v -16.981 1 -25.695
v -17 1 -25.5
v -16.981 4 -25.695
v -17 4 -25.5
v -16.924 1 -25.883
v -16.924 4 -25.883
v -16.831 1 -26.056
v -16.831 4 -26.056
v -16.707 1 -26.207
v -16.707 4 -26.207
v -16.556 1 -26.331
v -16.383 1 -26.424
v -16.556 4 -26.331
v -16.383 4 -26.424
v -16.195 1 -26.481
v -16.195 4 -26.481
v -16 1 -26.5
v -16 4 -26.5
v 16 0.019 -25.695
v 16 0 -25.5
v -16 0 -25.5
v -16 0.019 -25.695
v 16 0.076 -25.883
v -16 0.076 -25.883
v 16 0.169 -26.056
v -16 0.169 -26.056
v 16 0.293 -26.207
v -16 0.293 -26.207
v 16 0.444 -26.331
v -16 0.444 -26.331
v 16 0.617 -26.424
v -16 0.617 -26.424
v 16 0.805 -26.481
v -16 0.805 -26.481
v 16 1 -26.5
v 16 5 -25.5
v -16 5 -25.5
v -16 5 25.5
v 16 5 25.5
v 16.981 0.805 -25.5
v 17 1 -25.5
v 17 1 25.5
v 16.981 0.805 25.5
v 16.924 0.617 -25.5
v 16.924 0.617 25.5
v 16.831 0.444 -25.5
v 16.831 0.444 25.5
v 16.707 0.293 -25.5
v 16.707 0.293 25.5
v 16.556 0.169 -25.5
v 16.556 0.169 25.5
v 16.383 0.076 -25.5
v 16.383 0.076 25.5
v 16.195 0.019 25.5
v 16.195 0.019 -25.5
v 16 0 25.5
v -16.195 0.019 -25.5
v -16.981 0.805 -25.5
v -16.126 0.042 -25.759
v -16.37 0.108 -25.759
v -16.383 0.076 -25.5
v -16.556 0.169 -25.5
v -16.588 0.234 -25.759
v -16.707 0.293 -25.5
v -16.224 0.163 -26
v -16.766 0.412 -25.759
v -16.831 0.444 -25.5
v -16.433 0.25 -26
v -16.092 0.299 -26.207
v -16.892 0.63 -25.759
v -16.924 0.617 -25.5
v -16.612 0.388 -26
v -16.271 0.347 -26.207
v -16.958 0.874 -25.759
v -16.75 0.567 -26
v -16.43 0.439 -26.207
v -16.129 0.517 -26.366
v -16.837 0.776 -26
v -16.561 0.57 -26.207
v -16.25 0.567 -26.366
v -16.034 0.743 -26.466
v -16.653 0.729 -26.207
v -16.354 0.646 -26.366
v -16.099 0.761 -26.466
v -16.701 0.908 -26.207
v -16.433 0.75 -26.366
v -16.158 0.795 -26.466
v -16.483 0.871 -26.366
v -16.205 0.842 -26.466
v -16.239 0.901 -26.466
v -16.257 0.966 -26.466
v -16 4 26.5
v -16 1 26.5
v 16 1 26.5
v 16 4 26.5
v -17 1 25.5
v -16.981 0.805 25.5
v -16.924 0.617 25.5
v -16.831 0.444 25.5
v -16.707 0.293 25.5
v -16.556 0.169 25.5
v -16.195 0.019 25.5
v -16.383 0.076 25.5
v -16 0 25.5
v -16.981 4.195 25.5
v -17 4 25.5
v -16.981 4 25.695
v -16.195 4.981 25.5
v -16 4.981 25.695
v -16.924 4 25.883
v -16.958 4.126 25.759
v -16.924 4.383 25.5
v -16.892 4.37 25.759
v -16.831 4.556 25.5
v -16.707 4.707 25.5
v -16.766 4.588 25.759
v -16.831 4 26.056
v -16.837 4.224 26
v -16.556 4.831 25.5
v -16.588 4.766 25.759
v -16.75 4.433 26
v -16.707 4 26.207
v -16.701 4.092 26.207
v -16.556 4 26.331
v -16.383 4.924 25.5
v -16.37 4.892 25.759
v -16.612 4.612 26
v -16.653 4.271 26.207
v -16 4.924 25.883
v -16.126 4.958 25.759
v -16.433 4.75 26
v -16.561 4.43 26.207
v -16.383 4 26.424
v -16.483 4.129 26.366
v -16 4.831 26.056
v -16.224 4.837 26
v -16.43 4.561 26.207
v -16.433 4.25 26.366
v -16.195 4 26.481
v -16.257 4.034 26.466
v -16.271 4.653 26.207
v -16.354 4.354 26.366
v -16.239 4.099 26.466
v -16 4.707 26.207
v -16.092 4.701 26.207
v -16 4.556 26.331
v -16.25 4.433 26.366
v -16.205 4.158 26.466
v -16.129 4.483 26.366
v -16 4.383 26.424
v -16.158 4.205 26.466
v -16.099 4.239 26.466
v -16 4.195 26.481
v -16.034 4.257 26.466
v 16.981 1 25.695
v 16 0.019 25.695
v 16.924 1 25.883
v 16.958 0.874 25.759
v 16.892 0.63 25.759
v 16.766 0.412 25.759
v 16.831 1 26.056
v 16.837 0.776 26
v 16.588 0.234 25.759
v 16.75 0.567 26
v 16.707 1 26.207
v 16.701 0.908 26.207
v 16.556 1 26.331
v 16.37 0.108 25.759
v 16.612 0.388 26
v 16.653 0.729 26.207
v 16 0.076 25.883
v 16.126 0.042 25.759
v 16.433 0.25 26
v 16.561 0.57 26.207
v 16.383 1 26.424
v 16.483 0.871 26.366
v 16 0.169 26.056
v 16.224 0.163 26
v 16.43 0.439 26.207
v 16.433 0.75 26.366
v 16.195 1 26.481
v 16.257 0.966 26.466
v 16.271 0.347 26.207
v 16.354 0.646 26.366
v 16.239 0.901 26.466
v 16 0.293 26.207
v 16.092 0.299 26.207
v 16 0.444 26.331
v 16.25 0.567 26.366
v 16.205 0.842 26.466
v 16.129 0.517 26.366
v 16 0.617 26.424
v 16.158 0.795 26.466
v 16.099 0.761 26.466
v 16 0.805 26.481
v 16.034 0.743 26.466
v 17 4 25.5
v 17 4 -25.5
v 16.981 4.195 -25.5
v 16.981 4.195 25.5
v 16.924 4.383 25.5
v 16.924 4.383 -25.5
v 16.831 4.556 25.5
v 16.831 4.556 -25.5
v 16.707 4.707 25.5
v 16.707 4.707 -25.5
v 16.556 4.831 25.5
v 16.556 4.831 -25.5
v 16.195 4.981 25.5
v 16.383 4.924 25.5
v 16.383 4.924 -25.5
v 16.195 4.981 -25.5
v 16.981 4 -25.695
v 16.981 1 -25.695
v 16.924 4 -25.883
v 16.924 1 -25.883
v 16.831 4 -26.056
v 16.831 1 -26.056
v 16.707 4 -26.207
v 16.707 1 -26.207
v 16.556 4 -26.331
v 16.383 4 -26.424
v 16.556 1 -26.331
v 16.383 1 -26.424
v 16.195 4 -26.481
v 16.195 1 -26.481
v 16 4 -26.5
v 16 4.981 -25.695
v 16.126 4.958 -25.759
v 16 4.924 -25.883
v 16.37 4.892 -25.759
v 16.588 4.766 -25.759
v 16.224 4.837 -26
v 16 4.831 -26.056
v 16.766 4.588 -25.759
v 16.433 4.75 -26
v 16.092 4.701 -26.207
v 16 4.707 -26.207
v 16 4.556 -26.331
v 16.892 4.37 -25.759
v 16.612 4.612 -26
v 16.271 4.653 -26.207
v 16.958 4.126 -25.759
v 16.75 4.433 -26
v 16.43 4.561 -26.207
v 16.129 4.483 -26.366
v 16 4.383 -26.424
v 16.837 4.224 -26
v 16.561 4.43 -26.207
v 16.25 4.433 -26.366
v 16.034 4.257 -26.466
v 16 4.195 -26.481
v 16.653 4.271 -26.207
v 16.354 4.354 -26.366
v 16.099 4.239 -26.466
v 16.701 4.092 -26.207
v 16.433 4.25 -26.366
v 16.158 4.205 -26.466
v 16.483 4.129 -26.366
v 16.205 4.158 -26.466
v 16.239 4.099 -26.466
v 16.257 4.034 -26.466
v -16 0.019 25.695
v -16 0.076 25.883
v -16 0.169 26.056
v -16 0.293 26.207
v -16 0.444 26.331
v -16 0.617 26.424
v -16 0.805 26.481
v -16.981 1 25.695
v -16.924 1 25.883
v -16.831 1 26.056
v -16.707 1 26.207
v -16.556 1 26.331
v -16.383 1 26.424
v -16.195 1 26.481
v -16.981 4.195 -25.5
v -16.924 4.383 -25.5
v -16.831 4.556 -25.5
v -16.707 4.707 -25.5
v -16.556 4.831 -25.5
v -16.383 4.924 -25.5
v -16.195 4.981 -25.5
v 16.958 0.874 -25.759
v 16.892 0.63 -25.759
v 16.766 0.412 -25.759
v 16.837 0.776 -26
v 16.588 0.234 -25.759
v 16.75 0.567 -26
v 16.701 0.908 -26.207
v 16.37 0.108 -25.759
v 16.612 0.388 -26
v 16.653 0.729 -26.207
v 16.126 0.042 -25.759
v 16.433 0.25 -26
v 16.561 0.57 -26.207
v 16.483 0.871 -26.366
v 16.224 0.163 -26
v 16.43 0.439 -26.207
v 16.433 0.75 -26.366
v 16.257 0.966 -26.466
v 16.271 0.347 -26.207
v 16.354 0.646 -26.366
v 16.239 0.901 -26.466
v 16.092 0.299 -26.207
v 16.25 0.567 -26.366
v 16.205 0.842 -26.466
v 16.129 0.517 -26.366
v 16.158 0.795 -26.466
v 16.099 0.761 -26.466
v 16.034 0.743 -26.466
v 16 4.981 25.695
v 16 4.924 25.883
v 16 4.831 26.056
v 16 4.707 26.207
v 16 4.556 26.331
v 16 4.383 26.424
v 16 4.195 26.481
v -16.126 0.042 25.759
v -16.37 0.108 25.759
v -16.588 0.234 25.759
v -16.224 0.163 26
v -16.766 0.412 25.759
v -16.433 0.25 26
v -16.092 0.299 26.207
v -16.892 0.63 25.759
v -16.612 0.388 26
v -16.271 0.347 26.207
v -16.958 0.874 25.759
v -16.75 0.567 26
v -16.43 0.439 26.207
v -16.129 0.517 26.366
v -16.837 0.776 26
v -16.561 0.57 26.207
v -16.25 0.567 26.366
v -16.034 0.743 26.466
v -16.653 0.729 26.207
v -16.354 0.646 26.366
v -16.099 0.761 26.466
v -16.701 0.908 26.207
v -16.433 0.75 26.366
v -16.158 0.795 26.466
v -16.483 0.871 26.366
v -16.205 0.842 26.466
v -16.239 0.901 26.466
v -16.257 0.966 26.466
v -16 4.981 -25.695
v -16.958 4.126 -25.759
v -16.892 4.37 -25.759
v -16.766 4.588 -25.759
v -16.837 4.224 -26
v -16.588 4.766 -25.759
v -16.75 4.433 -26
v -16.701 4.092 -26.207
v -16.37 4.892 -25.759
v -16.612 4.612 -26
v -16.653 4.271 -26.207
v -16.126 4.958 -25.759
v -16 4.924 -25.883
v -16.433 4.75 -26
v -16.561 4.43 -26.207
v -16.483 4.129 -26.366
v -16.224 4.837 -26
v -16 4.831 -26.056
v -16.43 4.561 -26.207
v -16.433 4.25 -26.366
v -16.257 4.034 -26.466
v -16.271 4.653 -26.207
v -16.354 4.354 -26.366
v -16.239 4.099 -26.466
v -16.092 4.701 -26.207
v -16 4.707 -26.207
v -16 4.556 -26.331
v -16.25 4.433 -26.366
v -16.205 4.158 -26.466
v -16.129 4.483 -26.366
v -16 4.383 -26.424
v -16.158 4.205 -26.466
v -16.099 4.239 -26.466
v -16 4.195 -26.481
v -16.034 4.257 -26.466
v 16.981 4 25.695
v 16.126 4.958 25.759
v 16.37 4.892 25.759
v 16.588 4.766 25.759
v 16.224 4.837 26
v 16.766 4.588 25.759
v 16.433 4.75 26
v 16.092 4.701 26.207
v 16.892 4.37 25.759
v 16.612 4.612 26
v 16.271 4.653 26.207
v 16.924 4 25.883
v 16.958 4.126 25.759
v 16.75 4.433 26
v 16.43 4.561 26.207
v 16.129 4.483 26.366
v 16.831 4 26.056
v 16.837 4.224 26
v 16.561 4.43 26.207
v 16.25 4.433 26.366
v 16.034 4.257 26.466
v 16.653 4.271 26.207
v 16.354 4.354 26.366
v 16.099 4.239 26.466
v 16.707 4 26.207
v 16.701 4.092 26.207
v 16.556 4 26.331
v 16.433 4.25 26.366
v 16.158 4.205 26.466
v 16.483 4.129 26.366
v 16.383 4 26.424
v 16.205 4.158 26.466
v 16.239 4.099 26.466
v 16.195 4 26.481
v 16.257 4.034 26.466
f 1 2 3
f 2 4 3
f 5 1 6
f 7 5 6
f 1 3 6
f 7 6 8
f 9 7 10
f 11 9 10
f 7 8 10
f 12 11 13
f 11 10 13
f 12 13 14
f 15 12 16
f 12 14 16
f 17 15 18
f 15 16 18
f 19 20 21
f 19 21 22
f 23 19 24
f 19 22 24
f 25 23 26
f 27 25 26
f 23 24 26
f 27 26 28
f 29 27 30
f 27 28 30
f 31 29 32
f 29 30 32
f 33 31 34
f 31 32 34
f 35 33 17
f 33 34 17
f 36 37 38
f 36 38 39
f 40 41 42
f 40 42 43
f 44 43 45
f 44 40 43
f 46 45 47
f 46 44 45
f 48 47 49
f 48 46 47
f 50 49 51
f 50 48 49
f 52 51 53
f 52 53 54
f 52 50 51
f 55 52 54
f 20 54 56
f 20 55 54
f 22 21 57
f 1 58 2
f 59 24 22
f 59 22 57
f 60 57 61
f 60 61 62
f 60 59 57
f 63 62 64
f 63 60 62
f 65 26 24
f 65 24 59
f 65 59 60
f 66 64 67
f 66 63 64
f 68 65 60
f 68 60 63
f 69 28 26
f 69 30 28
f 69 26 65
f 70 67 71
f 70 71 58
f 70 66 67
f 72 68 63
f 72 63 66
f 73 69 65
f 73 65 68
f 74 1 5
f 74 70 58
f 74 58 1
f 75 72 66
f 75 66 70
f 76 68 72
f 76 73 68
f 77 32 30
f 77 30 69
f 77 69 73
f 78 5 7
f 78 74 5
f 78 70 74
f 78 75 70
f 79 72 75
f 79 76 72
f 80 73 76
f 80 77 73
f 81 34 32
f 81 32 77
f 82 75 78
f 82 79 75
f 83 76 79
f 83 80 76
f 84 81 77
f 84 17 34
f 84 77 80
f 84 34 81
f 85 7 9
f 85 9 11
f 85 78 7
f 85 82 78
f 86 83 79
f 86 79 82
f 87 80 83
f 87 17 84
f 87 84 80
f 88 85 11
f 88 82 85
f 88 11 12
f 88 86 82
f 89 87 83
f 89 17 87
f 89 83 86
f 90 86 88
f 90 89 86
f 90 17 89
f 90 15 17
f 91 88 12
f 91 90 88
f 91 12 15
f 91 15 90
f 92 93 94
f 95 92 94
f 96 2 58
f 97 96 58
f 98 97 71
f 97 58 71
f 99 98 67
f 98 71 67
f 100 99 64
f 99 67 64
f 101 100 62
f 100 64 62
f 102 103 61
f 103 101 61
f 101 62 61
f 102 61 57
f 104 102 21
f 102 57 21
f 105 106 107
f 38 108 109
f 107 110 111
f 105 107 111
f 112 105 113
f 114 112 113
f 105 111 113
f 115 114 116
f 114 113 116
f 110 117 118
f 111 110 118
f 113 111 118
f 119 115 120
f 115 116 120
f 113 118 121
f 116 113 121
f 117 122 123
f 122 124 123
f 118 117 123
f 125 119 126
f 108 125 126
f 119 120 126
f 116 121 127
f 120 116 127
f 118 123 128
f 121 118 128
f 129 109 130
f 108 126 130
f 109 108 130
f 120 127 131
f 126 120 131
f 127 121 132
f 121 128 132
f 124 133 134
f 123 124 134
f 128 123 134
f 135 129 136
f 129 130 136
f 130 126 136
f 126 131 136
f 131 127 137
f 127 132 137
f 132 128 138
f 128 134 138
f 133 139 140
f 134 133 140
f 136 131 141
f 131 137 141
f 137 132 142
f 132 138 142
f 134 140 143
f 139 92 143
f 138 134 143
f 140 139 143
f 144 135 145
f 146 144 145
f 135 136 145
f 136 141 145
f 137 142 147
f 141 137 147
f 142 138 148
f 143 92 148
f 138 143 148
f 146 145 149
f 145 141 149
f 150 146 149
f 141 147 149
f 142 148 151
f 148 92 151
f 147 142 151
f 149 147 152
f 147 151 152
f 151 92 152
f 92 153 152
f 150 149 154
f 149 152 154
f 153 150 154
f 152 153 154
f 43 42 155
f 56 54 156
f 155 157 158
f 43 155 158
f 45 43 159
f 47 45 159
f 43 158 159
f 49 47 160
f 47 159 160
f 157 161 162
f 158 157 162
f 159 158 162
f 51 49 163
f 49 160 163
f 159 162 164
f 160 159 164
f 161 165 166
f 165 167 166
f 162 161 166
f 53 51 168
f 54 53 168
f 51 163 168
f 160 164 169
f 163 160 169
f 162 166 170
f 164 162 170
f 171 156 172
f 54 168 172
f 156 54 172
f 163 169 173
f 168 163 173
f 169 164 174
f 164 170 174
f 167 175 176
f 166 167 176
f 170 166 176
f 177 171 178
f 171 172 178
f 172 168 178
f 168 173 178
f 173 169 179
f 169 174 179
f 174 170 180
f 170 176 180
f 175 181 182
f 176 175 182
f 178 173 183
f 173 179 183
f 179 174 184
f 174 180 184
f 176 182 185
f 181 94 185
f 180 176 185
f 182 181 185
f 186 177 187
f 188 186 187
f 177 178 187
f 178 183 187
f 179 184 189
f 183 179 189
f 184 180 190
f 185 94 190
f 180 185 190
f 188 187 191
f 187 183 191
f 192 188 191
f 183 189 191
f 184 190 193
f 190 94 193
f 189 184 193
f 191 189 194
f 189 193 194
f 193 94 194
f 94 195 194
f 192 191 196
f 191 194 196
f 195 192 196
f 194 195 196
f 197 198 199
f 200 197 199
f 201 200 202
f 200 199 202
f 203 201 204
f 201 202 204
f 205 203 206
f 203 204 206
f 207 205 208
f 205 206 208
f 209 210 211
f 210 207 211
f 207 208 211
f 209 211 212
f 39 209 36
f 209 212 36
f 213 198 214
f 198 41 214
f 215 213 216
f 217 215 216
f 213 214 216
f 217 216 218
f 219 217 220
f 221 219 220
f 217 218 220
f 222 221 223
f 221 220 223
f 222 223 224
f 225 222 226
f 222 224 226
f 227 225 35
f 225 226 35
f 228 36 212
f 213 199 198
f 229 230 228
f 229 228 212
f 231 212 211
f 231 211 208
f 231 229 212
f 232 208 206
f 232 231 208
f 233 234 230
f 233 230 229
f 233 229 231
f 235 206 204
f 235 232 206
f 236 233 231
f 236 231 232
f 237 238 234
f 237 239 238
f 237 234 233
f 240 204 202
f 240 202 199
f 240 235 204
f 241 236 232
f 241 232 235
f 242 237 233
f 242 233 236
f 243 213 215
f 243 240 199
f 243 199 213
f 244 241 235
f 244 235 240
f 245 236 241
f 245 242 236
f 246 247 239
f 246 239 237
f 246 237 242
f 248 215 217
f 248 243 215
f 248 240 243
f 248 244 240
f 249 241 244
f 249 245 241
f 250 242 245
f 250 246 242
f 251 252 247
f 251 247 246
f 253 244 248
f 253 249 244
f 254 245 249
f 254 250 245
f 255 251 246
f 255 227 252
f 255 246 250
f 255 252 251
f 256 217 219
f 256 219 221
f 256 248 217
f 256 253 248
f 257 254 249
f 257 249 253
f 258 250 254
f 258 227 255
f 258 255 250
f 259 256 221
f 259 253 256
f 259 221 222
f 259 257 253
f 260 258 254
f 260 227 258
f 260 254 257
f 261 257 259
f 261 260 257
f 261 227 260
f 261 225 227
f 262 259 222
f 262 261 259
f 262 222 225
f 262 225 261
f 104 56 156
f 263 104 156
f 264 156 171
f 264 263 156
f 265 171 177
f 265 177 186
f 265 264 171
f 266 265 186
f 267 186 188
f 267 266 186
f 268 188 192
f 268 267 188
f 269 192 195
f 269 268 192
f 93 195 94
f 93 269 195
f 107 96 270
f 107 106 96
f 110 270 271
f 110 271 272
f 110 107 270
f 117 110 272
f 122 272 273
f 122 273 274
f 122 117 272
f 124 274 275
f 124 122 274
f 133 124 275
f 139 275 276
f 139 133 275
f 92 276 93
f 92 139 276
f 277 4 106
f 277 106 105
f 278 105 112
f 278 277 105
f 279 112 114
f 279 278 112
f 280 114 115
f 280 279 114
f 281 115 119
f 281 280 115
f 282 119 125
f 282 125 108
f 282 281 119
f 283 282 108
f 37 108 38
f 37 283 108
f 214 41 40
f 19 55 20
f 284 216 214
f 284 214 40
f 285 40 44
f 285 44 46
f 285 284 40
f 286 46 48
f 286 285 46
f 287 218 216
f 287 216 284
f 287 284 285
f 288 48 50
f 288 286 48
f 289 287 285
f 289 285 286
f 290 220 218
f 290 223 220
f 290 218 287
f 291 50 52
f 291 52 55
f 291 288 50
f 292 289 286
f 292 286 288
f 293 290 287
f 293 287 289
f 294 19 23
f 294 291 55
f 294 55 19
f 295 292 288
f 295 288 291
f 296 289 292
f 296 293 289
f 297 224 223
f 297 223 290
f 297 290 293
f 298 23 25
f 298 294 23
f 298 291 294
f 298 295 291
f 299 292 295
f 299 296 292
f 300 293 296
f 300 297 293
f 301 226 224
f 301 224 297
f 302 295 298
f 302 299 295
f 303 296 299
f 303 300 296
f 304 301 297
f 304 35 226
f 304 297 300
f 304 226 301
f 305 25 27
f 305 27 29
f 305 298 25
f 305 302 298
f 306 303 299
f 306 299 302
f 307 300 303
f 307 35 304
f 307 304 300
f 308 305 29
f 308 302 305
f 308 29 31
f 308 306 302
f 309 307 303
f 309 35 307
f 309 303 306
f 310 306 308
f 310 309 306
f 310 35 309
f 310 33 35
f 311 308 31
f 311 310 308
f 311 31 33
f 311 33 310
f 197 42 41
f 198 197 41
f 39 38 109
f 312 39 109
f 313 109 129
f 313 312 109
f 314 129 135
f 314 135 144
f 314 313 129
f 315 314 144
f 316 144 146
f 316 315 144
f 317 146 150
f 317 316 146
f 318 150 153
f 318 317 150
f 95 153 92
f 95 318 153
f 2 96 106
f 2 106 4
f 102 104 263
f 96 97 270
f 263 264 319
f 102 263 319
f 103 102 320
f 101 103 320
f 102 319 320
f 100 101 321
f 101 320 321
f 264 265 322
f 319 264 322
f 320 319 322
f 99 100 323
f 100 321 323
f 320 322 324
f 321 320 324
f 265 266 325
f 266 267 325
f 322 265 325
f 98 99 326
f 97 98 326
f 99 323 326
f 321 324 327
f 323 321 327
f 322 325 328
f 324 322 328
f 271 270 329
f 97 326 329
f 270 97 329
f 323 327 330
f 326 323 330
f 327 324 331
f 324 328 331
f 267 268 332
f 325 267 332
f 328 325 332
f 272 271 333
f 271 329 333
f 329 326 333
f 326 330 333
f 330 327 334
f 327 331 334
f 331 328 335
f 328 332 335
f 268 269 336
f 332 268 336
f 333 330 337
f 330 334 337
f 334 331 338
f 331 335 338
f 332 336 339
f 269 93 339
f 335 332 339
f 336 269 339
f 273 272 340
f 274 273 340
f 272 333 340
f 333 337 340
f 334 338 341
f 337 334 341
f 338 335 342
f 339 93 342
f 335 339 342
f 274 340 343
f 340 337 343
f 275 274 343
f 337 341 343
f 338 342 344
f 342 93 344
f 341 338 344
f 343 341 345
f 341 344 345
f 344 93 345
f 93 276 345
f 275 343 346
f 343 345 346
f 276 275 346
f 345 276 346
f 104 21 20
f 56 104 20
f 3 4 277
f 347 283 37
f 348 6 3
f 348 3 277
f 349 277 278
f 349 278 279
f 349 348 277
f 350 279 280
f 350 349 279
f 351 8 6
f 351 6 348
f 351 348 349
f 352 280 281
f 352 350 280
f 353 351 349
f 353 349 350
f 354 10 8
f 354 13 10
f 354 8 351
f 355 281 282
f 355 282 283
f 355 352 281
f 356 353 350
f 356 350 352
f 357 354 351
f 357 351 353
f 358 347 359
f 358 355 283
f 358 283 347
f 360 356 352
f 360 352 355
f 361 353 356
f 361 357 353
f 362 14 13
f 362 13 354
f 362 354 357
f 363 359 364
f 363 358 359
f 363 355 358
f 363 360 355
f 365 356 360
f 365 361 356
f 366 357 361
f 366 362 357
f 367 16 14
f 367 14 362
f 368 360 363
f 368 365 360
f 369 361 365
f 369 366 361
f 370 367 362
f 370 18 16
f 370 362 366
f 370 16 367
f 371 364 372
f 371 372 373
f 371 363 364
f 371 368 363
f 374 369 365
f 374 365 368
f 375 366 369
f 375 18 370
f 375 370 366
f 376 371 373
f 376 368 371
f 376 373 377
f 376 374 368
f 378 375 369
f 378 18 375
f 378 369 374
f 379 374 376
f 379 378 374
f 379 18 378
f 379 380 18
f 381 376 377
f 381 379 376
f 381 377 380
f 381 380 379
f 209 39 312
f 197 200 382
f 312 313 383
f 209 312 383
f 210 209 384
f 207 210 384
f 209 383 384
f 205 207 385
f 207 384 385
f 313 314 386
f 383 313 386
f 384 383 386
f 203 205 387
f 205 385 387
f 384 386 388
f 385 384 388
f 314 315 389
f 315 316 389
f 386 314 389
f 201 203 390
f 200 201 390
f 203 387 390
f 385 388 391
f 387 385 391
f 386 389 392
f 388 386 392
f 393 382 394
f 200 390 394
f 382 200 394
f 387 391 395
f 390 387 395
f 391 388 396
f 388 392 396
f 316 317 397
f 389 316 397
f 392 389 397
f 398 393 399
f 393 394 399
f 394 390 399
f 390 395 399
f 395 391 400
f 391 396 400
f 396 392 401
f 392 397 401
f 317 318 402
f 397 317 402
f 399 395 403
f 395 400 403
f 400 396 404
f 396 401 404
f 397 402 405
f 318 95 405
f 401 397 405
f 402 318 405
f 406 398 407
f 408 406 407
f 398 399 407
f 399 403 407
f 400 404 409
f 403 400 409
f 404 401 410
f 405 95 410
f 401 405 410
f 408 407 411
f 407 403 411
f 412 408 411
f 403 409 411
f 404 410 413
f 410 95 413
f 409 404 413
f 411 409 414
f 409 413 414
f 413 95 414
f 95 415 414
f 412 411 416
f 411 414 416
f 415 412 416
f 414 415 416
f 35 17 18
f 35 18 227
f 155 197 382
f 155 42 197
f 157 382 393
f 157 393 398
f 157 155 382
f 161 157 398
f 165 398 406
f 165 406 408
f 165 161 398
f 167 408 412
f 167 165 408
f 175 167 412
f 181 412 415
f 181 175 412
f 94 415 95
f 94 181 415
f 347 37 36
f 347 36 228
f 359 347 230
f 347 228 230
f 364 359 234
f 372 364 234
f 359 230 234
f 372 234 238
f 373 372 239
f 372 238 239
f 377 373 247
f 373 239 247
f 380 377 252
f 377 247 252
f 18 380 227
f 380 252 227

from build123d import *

# Parameters (mm, degrees)
SKETCH1_W           = 34
SKETCH1_H           = 53
BOSS_EXTRUDE1_DEPTH = 5
FILLET1_R           = 1
FILLET2_R           = 1


with BuildPart() as part:
    # Sketch1 → Boss-Extrude1 (new body)
    with BuildSketch(Plane(origin=(0, 0, 0), x_dir=(1, 0, 0), z_dir=(0, 1, 0))):
        Rectangle(SKETCH1_W, SKETCH1_H)
    extrude(amount=BOSS_EXTRUDE1_DEPTH)

    # Fillet1
    fillet1_edges = [part.edges().sort_by_distance(p)[0] for p in [
        (-17, 5, 0),
        (17, 5, 0),
        (-17, 0, 0),
        (17, 0, 0),
    ]]
    fillet(fillet1_edges, radius=FILLET1_R)

    # Fillet2
    fillet2_edges = [part.edges().sort_by_distance(p)[0] for p in [
        (-17, 2.5, 26.5),
        (-17, 2.5, -26.5),
        (0, 0, 26.5),
        (17, 2.5, 26.5),
        (0, 5, 26.5),
        (16.707106781, 4.707106781, 26.5),
        (16.707106781, 0.292893219, 26.5),
        (-16.707106781, 4.707106781, 26.5),
        (-16.707106781, 0.292893219, 26.5),
        (0, 0, -26.5),
        (0, 5, -26.5),
        (17, 2.5, -26.5),
        (16.707106781, 4.707106781, -26.5),
        (16.707106781, 0.292893219, -26.5),
        (-16.707106781, 4.707106781, -26.5),
        (-16.707106781, 0.292893219, -26.5),
    ]]
    fillet(fillet2_edges, radius=FILLET2_R)


solid = part.part
